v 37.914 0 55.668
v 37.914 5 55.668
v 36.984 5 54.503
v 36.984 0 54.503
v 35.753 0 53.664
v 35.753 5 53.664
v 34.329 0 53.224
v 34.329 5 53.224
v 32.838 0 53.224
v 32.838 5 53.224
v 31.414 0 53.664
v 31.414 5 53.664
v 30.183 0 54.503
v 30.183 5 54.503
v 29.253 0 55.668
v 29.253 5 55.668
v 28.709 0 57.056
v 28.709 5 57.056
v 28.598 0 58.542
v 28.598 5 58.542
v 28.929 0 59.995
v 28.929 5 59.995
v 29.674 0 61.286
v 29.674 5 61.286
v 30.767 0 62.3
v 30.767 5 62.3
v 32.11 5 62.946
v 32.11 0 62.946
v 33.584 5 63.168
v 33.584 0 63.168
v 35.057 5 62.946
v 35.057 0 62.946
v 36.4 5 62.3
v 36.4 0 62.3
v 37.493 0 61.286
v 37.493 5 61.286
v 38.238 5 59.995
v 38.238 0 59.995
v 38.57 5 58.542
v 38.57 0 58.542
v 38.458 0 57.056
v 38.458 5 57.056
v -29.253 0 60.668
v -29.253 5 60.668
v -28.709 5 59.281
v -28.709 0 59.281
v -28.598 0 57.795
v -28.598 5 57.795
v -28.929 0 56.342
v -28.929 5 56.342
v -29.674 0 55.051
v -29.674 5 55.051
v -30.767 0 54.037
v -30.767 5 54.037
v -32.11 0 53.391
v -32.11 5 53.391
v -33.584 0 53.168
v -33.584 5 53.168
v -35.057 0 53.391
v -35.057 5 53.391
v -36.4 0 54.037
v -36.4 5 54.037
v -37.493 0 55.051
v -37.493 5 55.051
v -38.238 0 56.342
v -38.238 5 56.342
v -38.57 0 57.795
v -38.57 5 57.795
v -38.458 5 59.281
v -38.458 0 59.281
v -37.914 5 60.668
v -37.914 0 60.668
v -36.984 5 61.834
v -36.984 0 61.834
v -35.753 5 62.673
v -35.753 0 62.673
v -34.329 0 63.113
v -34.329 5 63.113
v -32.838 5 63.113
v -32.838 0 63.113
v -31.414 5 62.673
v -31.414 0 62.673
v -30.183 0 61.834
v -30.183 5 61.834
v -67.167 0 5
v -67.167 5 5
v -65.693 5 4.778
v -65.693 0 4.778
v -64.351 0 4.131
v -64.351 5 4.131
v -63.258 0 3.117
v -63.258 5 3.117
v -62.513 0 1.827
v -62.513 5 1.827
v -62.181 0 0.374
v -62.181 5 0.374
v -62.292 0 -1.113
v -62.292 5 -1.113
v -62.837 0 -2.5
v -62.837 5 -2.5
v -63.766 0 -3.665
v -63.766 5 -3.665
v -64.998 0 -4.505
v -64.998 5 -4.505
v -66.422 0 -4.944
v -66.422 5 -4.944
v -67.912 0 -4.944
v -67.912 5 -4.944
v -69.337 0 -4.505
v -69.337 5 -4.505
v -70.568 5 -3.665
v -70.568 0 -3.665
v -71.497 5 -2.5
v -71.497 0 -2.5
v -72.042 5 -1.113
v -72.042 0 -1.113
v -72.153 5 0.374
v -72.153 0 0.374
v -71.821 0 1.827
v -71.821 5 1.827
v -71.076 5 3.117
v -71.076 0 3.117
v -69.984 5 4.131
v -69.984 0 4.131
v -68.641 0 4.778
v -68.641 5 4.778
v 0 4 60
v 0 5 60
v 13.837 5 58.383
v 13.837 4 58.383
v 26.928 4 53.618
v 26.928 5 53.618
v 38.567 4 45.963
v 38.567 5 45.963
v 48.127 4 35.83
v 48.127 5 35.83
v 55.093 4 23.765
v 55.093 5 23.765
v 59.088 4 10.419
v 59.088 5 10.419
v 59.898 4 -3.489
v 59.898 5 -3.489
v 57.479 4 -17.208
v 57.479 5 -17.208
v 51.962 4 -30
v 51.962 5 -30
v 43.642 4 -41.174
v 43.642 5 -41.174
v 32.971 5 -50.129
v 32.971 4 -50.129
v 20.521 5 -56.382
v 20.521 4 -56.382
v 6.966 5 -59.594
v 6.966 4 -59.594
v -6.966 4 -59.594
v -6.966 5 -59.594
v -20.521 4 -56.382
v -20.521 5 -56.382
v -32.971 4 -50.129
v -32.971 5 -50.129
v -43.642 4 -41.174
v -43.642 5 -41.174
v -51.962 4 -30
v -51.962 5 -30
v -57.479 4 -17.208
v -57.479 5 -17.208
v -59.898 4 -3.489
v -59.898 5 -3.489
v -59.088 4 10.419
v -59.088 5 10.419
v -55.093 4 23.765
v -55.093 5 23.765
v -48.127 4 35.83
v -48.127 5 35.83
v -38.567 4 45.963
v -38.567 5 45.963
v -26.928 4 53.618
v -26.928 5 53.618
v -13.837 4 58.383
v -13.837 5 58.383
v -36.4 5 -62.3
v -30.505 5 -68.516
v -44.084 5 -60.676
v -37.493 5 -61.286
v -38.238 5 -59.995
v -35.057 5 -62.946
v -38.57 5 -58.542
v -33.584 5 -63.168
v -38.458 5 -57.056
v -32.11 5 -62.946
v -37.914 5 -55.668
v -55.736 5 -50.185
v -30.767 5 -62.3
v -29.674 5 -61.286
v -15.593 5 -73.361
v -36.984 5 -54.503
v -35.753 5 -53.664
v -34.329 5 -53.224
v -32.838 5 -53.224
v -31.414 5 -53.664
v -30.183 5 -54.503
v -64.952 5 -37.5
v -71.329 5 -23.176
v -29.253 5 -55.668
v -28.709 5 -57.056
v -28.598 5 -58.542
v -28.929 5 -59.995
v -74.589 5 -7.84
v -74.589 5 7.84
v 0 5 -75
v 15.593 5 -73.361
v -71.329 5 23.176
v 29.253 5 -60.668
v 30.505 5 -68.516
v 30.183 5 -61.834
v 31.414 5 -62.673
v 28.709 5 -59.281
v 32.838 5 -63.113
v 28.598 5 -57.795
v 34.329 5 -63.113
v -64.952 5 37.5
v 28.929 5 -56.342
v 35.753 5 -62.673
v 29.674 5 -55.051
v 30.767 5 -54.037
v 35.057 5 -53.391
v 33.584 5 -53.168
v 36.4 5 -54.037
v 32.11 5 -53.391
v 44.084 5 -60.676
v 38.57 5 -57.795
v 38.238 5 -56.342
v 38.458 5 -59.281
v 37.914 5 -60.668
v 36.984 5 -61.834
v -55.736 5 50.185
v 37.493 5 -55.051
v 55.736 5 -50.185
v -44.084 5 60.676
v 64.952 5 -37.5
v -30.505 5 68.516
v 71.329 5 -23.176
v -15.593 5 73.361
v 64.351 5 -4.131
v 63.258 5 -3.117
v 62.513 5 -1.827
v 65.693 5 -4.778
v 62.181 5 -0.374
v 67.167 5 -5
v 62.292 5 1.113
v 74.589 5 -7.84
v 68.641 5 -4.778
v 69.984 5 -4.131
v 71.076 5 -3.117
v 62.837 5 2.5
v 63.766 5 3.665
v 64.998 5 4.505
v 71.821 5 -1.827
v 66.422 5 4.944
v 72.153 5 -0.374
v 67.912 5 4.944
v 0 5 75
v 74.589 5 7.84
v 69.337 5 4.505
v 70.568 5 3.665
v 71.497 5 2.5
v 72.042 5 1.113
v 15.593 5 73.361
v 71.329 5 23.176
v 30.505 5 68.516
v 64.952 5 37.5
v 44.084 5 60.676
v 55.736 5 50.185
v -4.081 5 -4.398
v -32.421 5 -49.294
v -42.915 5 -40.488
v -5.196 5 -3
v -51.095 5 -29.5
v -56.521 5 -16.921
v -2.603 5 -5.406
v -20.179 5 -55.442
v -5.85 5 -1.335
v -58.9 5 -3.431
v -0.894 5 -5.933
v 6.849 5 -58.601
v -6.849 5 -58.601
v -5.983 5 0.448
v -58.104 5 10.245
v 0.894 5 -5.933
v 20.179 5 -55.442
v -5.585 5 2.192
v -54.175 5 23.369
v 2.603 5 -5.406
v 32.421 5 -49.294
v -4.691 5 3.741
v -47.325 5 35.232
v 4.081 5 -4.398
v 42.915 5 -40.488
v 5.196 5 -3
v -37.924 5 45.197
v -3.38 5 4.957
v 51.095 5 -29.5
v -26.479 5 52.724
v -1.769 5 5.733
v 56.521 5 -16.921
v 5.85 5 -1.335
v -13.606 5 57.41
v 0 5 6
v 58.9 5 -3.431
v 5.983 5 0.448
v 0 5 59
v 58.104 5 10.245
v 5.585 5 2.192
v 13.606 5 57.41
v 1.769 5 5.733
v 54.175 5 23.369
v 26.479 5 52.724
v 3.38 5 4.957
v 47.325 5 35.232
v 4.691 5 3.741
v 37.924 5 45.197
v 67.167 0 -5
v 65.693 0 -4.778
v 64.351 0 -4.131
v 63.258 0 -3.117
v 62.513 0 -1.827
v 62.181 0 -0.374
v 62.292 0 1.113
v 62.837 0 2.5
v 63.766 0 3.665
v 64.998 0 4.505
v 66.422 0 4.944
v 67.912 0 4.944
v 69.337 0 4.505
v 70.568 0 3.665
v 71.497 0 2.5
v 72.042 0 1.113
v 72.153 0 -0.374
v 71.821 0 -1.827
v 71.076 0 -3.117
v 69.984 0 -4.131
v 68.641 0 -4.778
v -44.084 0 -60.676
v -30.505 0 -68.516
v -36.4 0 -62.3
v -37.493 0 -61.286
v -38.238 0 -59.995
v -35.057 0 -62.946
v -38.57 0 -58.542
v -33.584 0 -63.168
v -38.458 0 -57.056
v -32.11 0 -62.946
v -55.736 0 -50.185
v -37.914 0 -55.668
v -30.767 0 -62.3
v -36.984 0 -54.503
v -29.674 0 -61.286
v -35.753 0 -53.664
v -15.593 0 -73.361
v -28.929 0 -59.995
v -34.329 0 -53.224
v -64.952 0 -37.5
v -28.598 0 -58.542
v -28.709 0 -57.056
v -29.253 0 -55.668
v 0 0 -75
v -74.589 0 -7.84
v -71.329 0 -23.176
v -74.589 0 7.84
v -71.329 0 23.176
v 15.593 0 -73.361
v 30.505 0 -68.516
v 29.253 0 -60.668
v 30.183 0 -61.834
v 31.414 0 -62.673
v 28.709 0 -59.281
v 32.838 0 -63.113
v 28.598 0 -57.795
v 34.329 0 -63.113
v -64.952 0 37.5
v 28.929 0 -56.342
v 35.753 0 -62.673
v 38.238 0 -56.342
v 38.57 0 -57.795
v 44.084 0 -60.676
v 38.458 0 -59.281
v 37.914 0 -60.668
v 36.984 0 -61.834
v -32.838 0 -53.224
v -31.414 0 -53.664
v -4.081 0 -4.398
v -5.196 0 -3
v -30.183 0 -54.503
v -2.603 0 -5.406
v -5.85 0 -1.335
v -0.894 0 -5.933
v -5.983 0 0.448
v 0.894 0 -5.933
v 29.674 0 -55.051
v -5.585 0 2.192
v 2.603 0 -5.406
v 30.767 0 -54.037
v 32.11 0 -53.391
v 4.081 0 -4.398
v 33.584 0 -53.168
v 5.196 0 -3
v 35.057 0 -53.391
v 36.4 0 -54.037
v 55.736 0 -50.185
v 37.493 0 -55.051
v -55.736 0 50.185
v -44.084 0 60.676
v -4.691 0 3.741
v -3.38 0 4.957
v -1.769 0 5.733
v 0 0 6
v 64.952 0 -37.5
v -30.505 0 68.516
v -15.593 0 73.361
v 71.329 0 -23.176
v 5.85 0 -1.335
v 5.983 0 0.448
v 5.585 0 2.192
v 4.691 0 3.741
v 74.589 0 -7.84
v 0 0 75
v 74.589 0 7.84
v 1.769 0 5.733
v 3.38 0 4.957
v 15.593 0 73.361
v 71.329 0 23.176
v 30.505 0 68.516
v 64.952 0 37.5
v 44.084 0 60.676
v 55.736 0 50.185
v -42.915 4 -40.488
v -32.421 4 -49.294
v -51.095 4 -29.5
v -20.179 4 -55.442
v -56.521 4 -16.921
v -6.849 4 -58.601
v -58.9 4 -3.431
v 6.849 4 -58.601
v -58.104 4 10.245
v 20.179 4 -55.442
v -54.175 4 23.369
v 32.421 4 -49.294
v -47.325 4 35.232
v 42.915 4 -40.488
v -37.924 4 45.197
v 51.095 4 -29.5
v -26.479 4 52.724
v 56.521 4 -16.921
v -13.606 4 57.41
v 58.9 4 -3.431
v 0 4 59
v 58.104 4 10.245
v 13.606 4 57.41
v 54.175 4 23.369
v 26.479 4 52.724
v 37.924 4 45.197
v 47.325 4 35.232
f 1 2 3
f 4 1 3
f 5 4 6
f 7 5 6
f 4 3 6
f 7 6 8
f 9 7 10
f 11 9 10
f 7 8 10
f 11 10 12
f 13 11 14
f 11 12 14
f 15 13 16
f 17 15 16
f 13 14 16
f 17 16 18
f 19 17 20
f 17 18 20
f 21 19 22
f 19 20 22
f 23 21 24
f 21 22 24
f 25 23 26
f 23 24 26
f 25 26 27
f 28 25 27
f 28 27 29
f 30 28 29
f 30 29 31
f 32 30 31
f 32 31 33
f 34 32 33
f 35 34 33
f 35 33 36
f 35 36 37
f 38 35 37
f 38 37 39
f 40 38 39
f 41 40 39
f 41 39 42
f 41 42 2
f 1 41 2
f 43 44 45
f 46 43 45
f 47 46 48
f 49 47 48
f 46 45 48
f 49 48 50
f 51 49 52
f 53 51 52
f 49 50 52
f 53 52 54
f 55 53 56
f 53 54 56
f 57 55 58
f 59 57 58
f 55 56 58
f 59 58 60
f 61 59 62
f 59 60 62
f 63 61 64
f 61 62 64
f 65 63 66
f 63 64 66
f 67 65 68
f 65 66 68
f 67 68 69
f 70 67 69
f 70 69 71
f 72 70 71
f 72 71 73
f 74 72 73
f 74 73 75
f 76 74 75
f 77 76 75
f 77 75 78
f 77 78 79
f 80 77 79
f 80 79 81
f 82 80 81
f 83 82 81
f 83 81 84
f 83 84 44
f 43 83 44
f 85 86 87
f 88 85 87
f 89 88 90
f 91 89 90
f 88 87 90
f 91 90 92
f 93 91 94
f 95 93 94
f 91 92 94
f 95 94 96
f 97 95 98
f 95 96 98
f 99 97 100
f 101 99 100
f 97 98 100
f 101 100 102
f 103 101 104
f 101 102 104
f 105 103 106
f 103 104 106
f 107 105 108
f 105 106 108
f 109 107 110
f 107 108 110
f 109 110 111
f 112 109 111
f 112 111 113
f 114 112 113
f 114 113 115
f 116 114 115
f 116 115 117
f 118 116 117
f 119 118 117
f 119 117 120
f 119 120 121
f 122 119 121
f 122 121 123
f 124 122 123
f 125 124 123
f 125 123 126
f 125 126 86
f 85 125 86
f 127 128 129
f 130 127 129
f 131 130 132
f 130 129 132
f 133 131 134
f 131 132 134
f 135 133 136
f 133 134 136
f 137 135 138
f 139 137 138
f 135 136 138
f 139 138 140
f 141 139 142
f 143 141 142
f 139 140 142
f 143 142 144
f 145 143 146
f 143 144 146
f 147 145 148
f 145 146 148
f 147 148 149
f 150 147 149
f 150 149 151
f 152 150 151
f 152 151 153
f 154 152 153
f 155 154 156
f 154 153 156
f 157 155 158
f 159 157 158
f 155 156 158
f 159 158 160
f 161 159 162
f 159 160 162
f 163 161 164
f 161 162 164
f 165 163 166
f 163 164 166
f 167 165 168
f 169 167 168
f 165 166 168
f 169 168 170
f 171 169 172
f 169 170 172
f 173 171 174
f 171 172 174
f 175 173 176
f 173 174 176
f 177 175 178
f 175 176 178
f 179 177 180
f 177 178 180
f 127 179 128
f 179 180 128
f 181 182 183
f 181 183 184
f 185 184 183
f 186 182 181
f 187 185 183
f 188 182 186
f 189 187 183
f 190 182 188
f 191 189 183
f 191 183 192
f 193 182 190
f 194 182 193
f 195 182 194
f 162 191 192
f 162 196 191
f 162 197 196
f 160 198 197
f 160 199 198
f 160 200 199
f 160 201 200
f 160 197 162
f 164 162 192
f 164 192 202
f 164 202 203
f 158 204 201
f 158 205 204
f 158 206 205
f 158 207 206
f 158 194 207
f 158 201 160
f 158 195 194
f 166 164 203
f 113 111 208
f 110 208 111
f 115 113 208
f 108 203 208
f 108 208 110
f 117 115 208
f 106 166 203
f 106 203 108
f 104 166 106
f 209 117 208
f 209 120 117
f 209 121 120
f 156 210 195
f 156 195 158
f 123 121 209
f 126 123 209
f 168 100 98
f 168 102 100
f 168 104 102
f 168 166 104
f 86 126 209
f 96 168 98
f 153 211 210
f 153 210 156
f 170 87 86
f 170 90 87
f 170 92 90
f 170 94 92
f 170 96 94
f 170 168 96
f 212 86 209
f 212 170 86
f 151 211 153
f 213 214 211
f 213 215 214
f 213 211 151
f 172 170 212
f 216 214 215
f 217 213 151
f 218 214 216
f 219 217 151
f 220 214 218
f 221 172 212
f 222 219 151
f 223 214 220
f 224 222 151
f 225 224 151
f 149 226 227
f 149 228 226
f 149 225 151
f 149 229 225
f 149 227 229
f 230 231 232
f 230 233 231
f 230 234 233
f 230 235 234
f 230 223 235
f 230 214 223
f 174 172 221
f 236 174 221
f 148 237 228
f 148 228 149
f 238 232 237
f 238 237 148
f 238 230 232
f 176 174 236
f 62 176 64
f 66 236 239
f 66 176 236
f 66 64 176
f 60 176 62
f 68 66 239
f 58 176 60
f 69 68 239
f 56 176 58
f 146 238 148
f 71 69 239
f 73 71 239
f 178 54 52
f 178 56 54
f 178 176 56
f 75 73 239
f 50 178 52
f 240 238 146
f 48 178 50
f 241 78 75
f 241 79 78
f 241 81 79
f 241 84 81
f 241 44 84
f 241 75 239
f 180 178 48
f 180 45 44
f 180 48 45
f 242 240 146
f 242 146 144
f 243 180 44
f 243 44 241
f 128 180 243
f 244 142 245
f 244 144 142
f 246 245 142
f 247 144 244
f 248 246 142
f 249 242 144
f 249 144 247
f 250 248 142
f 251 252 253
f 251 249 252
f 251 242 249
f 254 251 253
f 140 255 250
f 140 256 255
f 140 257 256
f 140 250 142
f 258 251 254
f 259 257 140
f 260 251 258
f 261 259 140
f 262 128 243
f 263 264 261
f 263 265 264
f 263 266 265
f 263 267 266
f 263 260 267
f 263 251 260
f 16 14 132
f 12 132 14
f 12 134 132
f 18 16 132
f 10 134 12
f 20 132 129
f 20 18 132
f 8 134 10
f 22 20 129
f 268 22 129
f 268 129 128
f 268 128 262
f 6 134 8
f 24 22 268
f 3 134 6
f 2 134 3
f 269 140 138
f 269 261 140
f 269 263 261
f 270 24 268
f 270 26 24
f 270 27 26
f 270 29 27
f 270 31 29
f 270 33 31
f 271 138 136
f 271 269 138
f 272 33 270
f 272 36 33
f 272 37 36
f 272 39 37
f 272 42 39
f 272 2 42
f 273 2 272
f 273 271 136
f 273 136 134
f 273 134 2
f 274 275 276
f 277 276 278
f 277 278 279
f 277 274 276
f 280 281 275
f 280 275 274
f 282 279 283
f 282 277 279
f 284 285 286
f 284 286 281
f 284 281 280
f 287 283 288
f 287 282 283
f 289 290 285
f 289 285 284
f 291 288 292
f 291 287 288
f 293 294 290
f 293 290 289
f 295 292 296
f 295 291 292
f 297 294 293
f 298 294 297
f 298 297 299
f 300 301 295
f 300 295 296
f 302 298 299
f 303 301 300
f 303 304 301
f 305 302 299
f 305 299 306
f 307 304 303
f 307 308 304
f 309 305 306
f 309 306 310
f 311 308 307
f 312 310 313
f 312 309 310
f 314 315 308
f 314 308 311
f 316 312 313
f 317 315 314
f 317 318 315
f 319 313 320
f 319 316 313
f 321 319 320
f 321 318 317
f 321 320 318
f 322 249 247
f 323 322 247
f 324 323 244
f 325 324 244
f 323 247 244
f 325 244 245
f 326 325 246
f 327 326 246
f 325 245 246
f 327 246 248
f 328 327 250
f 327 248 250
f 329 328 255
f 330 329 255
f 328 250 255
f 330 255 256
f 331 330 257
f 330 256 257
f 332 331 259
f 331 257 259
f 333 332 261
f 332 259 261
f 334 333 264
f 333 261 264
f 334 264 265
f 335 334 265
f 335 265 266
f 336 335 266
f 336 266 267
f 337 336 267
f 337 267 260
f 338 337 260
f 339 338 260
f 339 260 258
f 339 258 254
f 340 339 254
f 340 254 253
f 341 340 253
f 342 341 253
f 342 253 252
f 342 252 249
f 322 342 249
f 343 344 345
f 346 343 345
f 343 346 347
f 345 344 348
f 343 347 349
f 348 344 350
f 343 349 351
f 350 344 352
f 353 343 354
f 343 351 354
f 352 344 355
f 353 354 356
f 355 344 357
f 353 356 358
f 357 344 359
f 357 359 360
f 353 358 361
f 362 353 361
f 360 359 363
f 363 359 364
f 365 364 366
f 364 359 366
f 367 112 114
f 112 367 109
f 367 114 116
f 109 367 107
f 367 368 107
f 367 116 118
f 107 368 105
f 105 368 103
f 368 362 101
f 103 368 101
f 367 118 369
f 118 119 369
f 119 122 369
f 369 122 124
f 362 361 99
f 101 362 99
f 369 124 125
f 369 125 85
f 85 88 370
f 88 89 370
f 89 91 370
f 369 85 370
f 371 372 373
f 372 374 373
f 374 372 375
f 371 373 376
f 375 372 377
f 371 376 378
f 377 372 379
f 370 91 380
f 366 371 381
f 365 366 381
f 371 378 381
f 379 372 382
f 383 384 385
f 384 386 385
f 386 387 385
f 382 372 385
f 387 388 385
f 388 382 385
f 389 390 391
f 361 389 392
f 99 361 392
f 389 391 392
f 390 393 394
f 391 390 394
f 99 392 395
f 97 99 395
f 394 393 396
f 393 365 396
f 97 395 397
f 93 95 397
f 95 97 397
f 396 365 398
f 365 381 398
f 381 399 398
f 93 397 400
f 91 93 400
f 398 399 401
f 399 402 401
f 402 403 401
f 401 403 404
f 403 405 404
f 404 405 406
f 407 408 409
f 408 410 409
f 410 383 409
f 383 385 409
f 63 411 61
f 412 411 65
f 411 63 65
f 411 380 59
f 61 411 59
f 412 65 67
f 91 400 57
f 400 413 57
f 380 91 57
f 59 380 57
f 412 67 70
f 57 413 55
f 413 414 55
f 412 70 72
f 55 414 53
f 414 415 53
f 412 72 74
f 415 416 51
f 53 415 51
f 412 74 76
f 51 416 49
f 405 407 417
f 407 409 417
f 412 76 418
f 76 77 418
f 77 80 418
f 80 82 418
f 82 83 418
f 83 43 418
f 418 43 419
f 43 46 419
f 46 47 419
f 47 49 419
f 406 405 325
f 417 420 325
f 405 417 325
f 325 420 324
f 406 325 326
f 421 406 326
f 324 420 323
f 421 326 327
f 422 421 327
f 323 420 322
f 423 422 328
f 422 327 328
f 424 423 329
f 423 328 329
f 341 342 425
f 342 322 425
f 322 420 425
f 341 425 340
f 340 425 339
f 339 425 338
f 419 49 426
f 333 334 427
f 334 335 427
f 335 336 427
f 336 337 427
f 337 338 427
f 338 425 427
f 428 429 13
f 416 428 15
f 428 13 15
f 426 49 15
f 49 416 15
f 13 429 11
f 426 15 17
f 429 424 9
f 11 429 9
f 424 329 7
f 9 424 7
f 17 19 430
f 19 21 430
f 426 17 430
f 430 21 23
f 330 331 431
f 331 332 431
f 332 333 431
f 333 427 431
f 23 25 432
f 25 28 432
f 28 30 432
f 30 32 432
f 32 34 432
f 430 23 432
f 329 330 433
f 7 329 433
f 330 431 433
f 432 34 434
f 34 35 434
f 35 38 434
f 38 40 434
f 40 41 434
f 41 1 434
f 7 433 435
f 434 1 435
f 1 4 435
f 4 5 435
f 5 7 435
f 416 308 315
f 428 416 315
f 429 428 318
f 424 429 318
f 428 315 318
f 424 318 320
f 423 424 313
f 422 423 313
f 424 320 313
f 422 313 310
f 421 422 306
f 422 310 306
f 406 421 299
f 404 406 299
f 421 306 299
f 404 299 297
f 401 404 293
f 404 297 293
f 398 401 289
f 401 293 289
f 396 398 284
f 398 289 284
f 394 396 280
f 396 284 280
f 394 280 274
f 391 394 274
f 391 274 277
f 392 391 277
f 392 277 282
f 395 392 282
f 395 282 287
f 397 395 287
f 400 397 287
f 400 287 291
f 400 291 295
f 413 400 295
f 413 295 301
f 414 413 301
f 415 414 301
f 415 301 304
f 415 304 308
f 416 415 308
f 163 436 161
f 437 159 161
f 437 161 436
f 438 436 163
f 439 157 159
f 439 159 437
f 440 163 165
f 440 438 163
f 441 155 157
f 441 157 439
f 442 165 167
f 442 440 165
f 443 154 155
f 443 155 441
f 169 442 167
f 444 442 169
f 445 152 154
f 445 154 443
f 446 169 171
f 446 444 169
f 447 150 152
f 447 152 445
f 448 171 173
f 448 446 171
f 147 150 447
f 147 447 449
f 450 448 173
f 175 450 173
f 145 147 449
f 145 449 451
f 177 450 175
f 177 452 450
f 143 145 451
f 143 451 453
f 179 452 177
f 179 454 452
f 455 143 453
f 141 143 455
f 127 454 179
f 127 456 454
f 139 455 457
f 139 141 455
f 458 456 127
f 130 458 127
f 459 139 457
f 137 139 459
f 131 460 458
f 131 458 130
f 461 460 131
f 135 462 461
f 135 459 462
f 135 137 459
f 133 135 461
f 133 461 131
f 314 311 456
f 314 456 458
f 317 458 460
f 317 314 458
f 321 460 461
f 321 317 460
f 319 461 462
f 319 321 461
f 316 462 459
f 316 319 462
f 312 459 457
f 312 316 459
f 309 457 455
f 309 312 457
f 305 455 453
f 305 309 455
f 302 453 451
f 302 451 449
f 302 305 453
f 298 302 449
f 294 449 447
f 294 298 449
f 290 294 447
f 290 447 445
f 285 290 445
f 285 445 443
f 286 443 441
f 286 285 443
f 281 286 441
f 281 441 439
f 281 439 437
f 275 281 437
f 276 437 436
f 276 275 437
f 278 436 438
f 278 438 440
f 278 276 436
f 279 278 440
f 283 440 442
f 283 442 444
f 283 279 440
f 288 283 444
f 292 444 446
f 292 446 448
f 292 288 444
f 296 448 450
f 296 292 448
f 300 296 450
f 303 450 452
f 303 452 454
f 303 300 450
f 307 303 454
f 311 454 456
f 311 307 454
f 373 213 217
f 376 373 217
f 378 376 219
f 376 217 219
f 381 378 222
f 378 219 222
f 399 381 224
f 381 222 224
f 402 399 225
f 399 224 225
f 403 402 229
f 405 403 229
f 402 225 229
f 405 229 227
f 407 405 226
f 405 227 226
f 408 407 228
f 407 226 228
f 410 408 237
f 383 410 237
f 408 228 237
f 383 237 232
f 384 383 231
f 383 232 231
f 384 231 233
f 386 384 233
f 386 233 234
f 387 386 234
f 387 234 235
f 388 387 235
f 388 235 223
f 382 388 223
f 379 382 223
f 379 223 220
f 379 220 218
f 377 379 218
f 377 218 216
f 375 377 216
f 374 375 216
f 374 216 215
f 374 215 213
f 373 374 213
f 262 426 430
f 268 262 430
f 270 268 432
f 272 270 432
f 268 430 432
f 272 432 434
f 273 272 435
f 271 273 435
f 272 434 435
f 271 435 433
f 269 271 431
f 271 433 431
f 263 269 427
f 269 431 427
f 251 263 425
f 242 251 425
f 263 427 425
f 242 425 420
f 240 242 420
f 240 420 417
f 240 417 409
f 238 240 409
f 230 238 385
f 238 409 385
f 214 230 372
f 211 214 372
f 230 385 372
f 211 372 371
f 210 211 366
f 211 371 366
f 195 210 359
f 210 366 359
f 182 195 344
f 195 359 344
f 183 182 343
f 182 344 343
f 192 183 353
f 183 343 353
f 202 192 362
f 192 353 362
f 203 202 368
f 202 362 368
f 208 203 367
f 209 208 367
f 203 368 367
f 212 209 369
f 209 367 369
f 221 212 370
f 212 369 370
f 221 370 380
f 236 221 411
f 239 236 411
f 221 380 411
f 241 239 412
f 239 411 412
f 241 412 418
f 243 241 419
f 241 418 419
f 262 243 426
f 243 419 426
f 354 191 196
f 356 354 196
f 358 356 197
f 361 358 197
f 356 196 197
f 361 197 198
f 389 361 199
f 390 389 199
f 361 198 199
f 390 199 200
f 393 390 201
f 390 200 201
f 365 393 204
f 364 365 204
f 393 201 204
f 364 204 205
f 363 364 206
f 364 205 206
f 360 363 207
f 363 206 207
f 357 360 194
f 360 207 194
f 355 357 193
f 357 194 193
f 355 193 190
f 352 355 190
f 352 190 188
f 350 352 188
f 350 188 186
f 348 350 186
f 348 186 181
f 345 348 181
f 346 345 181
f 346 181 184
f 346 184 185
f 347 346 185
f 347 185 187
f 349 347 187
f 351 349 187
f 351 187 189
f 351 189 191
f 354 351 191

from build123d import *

# Parameters (mm, degrees)
SKETCH1_R           = 75
BOSS_EXTRUDE1_DEPTH = 5
SKETCH2_R           = 60
SKETCH2_R_2         = 59
CUT_EXTRUDE1_DEPTH  = 1
SKETCH3_R           = 5
CUT_EXTRUDE2_DEPTH  = 161
CIRPATTERN2_COUNT   = 6
SKETCH4_R           = 6
CUT_EXTRUDE3_DEPTH  = 10


with BuildPart() as part:
    # Sketch1 → Boss-Extrude1 (new body)
    with BuildSketch(Plane(origin=(0, 0, 0), x_dir=(1, 0, 0), z_dir=(0, 1, 0))):
        with Locations(Location((0, 0, 0), (0, 0, 270))):
            Circle(SKETCH1_R)
    extrude(amount=BOSS_EXTRUDE1_DEPTH)

    # Sketch2 → Cut-Extrude1 (cut)
    with BuildSketch(Plane(origin=(0, 5, 0), x_dir=(1, 0, 0), z_dir=(0, 1, 0))):
        with Locations(Location((0, 0, 0), (0, 0, 270))):
            Circle(SKETCH2_R)
        with Locations(Location((0, 0, 0), (0, 0, 270))):
            Circle(SKETCH2_R_2, mode=Mode.SUBTRACT)
    extrude(amount=-CUT_EXTRUDE1_DEPTH, mode=Mode.SUBTRACT)

    # Sketch3 → Cut-Extrude2 (cut)
    with BuildSketch(Plane(origin=(0, 5, 0), x_dir=(1, 0, 0), z_dir=(0, 1, 0))):
        with Locations(Location((-67.167126111, 0, 0), (0, 0, 270))):
            Circle(SKETCH3_R)
    cut_extrude2 = extrude(amount=-CUT_EXTRUDE2_DEPTH, mode=Mode.SUBTRACT)

    # CirPattern2: Cut-Extrude2 ×6 about axis
    cirpattern2_axis = Axis((0, 0, 0), (0, 1, 0))
    for i in range(1, CIRPATTERN2_COUNT):
        add(cut_extrude2.rotate(cirpattern2_axis, i * 360 / CIRPATTERN2_COUNT), mode=Mode.SUBTRACT)

    # Sketch4 → Cut-Extrude3 (cut)
    with BuildSketch(Plane(origin=(0, 5, 0), x_dir=(1, 0, 0), z_dir=(0, 1, 0))):
        with Locations(Location((0, 0, 0), (0, 0, 270))):
            Circle(SKETCH4_R)
    extrude(amount=-CUT_EXTRUDE3_DEPTH, mode=Mode.SUBTRACT)


solid = part.part
